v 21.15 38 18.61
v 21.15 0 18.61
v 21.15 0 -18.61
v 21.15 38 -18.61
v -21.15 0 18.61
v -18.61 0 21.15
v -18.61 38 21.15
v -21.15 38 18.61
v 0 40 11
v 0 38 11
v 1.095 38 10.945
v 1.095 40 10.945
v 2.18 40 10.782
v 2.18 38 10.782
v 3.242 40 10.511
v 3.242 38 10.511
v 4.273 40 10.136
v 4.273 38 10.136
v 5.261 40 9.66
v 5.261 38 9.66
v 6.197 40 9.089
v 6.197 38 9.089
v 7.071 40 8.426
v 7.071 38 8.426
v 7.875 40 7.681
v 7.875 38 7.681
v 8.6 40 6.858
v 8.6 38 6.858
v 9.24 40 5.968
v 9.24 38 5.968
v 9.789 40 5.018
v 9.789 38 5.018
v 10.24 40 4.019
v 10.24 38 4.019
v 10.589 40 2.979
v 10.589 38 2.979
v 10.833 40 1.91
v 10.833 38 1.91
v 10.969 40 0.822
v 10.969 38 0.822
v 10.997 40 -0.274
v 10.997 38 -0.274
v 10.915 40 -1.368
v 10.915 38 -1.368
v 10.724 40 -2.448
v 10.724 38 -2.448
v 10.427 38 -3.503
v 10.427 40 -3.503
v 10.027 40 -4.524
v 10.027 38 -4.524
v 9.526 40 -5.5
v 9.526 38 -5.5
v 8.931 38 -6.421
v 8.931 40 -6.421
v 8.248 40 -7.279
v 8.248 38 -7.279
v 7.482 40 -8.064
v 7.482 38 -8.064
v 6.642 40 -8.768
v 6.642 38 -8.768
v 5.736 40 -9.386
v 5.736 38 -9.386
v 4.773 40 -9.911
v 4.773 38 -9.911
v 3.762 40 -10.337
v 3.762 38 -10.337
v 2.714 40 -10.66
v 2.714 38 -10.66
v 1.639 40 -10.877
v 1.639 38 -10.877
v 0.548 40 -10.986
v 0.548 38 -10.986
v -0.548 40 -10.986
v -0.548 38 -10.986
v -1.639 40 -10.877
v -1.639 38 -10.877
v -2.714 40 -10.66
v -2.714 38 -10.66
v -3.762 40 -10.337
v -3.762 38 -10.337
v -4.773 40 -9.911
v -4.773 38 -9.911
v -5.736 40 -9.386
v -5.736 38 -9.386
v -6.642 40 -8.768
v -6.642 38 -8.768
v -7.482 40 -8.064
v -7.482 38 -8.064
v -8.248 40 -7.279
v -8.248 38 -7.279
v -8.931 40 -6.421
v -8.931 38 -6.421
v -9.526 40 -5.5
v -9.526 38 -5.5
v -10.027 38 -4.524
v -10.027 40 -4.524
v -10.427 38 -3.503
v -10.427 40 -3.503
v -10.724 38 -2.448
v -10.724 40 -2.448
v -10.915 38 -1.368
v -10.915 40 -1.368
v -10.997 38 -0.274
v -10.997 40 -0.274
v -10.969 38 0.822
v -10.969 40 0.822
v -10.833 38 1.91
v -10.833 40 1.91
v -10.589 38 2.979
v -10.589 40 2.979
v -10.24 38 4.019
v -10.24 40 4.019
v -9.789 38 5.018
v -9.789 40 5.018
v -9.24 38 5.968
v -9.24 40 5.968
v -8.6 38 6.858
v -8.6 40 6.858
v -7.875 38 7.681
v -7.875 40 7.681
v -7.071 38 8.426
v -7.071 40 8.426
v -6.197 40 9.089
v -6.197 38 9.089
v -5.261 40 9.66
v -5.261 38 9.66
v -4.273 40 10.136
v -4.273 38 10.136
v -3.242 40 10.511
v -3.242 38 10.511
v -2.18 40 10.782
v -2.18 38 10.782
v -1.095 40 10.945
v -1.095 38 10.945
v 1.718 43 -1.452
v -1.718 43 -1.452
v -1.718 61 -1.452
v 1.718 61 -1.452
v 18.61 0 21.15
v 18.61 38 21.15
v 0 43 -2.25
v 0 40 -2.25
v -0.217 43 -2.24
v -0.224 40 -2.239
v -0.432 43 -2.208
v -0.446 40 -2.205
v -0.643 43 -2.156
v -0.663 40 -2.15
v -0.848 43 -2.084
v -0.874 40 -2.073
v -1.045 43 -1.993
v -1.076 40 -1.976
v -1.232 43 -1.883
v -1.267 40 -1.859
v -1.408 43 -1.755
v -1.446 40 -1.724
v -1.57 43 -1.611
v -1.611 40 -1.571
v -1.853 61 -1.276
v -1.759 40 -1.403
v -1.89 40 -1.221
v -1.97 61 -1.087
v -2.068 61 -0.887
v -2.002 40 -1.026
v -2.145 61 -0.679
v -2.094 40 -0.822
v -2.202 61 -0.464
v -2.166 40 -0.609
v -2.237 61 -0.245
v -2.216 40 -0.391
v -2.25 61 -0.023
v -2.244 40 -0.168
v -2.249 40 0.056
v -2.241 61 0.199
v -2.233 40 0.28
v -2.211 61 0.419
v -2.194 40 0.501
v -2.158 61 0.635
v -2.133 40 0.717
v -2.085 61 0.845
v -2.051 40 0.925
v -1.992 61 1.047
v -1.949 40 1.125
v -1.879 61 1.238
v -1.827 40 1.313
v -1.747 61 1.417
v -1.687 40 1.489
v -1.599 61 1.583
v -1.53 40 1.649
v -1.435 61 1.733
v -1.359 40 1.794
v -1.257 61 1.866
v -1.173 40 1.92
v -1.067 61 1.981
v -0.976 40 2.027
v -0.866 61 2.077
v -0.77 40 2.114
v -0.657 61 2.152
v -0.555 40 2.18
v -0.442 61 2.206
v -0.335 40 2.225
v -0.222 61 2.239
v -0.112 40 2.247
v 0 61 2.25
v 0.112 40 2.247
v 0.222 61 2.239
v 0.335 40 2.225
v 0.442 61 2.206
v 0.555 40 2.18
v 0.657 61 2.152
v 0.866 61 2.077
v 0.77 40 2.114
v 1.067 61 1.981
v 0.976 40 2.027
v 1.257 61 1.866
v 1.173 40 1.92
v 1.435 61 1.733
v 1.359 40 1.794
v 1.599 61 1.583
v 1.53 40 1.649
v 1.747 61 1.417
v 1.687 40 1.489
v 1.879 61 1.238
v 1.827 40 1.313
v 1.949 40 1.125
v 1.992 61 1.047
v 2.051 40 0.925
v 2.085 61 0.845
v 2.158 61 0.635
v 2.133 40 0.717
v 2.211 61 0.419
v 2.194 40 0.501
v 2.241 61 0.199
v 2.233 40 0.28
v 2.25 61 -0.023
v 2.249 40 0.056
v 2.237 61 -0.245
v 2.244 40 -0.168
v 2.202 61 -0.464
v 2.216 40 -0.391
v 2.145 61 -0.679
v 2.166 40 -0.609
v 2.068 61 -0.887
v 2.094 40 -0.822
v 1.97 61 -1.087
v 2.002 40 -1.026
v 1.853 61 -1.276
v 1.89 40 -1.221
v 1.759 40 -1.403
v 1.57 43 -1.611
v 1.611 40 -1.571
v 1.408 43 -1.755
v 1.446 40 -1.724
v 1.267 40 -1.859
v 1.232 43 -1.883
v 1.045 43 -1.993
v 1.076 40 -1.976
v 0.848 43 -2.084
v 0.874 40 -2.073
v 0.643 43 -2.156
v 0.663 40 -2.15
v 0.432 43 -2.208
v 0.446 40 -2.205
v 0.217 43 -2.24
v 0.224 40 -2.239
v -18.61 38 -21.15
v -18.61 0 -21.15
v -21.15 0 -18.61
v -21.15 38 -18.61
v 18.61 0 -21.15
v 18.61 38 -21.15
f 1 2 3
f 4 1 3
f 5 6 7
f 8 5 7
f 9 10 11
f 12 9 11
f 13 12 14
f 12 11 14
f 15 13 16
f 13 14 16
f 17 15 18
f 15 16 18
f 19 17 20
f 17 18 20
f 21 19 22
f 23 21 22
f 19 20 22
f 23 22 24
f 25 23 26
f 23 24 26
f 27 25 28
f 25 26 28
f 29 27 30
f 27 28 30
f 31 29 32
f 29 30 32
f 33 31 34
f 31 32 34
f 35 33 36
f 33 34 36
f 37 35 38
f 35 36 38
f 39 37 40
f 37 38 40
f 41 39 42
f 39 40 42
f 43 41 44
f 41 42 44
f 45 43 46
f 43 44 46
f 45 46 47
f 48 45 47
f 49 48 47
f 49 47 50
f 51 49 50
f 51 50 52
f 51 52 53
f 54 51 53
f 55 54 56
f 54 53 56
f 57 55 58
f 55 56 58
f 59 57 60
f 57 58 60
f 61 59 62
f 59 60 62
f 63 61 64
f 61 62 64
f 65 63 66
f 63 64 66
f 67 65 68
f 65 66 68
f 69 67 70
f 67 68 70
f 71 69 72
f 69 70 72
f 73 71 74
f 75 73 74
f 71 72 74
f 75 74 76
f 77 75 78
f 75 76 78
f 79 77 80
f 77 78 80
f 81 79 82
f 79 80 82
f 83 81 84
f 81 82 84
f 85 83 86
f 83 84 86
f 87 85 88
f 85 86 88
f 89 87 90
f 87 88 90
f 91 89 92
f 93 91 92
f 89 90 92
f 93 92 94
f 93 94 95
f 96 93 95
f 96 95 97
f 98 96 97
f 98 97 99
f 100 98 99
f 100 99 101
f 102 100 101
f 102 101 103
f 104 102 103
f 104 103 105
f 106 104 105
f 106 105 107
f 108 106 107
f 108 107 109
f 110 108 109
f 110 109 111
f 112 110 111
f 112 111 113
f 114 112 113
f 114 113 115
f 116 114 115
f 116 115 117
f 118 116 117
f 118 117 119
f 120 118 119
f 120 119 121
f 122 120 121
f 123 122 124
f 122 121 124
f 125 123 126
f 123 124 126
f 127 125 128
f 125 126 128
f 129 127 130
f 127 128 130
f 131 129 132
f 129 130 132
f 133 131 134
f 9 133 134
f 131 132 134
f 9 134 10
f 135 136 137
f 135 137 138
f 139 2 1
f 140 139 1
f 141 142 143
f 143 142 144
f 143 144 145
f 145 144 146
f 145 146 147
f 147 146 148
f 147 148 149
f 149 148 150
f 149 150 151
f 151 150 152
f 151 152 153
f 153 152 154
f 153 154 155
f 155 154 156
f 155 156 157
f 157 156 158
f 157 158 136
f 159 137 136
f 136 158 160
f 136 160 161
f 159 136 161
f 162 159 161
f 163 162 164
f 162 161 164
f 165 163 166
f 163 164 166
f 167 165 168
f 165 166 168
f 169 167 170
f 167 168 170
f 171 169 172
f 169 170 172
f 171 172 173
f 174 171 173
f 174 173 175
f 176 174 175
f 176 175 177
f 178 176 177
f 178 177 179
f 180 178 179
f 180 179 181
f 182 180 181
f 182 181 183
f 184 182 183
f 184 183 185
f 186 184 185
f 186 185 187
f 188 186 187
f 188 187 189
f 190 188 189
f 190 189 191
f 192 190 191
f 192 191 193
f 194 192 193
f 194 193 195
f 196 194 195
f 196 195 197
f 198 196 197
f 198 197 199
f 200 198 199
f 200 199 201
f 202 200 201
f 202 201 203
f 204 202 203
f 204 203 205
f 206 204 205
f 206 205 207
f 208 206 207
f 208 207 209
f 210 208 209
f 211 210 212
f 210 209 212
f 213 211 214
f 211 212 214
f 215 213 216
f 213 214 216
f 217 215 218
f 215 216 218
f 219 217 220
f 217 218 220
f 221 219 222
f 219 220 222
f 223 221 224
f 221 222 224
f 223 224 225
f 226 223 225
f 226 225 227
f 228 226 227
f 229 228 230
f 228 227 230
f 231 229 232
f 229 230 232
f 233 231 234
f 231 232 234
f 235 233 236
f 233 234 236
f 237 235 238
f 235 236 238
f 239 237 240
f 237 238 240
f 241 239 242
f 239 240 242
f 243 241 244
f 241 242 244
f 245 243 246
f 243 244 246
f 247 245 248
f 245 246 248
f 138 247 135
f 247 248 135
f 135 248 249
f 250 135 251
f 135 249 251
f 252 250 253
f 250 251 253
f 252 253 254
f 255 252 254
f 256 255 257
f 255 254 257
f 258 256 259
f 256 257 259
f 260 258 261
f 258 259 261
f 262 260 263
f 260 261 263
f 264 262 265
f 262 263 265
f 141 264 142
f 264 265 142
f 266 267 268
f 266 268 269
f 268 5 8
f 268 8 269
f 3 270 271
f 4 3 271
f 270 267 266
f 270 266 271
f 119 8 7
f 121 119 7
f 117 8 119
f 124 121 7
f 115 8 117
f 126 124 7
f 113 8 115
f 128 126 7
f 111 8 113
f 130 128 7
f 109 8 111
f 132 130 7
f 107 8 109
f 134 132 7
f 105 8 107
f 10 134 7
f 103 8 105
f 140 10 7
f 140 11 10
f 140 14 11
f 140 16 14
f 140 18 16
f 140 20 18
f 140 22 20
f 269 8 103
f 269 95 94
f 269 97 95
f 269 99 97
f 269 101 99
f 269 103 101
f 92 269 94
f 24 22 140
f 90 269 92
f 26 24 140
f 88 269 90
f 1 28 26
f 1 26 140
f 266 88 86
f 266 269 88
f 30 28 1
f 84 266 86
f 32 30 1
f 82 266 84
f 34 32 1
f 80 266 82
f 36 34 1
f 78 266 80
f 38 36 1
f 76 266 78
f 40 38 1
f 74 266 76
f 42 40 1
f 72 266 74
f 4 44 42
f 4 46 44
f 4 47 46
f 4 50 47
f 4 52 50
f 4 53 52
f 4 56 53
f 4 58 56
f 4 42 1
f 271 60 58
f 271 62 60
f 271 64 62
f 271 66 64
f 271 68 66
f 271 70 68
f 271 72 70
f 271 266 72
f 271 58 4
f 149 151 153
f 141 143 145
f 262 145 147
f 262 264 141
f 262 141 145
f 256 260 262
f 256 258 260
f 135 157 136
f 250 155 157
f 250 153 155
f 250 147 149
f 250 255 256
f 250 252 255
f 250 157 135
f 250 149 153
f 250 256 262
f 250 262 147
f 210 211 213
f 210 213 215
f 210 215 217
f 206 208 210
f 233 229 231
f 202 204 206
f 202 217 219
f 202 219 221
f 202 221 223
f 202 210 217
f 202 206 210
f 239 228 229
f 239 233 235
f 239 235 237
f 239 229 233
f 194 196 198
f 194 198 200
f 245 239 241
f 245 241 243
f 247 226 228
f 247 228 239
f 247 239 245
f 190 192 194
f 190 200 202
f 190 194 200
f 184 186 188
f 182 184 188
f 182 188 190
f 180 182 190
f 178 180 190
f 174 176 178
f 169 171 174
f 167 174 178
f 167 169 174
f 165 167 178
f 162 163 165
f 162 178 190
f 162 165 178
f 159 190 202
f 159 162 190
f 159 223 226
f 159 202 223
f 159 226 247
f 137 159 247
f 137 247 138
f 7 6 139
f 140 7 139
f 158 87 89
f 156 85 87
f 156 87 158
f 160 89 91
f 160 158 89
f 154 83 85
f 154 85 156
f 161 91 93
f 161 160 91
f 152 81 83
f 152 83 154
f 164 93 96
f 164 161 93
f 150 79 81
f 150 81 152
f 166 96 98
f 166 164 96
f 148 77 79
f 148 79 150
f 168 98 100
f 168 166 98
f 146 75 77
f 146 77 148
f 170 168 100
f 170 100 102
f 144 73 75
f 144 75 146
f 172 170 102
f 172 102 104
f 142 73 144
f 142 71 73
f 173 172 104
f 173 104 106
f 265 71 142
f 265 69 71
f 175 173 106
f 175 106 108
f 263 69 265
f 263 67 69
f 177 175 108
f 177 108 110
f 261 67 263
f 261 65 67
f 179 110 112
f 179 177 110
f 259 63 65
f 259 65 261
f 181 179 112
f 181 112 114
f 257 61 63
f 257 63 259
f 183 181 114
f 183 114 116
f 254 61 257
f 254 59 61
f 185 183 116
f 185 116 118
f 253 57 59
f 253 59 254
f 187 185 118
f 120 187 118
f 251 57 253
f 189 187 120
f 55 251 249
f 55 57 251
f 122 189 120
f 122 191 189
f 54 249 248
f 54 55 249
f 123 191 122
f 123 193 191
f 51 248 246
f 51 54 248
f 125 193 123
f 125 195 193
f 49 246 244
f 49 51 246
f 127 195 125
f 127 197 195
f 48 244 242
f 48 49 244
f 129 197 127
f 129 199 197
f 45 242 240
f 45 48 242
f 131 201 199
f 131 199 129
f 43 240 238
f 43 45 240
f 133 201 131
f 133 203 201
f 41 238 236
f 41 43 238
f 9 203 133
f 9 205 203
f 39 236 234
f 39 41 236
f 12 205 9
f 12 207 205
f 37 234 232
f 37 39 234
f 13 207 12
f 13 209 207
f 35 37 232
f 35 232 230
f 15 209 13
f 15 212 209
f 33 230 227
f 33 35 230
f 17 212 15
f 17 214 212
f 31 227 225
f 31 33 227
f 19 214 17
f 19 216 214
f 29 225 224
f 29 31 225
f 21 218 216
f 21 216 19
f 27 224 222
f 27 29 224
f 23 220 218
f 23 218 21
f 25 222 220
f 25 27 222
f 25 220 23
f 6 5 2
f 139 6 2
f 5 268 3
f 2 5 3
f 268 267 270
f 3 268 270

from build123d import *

# Parameters (mm, degrees)
SKETCH1_W           = 42.299999982
SKETCH1_H           = 42.3
BOSS_EXTRUDE1_DEPTH = 38
CHAMFER1_SIZE       = 2.54
SKETCH2_R           = 11
BOSS_EXTRUDE2_DEPTH = 2
SKETCH3_R           = 2.25
BOSS_EXTRUDE3_DEPTH = 21
SKETCH4_W           = 3.436789712
SKETCH4_H           = 1.59509441
CUT_EXTRUDE1_DEPTH  = 18


with BuildPart() as part:
    # Sketch1 → Boss-Extrude1 (new body)
    with BuildSketch(Plane(origin=(0, 0, 0), x_dir=(1, 0, 0), z_dir=(0, 1, 0))):
        Rectangle(SKETCH1_W, SKETCH1_H)
    extrude(amount=BOSS_EXTRUDE1_DEPTH)

    # Chamfer1
    chamfer1_edges = [part.edges().sort_by_distance(p)[0] for p in [
        (21.149999991, 19, 21.15),
        (-21.149999991, 19, 21.15),
        (-21.149999991, 19, -21.15),
        (21.149999991, 19, -21.15),
    ]]
    chamfer(chamfer1_edges, length=CHAMFER1_SIZE)

    # Sketch2 → Boss-Extrude2 (add)
    with BuildSketch(Plane(origin=(0, 38, 0), x_dir=(1, 0, 0), z_dir=(0, 1, 0))):
        with Locations(Location((0, 0, 0), (0, 0, 270))):
            Circle(SKETCH2_R)
    extrude(amount=BOSS_EXTRUDE2_DEPTH)

    # Sketch3 → Boss-Extrude3 (add)
    with BuildSketch(Plane(origin=(0, 40, 0), x_dir=(1, 0, 0), z_dir=(0, 1, 0))):
        with Locations(Location((0, 0, 0), (0, 0, 90))):
            Circle(SKETCH3_R)
    extrude(amount=BOSS_EXTRUDE3_DEPTH)

    # Sketch4 → Cut-Extrude1 (cut)
    with BuildSketch(Plane(origin=(0, 61, 0), x_dir=(1, 0, 0), z_dir=(0, 1, 0))):
        with Locations((0, 2.25)):
            Rectangle(SKETCH4_W, SKETCH4_H)
    extrude(amount=-CUT_EXTRUDE1_DEPTH, mode=Mode.SUBTRACT)


solid = part.part
